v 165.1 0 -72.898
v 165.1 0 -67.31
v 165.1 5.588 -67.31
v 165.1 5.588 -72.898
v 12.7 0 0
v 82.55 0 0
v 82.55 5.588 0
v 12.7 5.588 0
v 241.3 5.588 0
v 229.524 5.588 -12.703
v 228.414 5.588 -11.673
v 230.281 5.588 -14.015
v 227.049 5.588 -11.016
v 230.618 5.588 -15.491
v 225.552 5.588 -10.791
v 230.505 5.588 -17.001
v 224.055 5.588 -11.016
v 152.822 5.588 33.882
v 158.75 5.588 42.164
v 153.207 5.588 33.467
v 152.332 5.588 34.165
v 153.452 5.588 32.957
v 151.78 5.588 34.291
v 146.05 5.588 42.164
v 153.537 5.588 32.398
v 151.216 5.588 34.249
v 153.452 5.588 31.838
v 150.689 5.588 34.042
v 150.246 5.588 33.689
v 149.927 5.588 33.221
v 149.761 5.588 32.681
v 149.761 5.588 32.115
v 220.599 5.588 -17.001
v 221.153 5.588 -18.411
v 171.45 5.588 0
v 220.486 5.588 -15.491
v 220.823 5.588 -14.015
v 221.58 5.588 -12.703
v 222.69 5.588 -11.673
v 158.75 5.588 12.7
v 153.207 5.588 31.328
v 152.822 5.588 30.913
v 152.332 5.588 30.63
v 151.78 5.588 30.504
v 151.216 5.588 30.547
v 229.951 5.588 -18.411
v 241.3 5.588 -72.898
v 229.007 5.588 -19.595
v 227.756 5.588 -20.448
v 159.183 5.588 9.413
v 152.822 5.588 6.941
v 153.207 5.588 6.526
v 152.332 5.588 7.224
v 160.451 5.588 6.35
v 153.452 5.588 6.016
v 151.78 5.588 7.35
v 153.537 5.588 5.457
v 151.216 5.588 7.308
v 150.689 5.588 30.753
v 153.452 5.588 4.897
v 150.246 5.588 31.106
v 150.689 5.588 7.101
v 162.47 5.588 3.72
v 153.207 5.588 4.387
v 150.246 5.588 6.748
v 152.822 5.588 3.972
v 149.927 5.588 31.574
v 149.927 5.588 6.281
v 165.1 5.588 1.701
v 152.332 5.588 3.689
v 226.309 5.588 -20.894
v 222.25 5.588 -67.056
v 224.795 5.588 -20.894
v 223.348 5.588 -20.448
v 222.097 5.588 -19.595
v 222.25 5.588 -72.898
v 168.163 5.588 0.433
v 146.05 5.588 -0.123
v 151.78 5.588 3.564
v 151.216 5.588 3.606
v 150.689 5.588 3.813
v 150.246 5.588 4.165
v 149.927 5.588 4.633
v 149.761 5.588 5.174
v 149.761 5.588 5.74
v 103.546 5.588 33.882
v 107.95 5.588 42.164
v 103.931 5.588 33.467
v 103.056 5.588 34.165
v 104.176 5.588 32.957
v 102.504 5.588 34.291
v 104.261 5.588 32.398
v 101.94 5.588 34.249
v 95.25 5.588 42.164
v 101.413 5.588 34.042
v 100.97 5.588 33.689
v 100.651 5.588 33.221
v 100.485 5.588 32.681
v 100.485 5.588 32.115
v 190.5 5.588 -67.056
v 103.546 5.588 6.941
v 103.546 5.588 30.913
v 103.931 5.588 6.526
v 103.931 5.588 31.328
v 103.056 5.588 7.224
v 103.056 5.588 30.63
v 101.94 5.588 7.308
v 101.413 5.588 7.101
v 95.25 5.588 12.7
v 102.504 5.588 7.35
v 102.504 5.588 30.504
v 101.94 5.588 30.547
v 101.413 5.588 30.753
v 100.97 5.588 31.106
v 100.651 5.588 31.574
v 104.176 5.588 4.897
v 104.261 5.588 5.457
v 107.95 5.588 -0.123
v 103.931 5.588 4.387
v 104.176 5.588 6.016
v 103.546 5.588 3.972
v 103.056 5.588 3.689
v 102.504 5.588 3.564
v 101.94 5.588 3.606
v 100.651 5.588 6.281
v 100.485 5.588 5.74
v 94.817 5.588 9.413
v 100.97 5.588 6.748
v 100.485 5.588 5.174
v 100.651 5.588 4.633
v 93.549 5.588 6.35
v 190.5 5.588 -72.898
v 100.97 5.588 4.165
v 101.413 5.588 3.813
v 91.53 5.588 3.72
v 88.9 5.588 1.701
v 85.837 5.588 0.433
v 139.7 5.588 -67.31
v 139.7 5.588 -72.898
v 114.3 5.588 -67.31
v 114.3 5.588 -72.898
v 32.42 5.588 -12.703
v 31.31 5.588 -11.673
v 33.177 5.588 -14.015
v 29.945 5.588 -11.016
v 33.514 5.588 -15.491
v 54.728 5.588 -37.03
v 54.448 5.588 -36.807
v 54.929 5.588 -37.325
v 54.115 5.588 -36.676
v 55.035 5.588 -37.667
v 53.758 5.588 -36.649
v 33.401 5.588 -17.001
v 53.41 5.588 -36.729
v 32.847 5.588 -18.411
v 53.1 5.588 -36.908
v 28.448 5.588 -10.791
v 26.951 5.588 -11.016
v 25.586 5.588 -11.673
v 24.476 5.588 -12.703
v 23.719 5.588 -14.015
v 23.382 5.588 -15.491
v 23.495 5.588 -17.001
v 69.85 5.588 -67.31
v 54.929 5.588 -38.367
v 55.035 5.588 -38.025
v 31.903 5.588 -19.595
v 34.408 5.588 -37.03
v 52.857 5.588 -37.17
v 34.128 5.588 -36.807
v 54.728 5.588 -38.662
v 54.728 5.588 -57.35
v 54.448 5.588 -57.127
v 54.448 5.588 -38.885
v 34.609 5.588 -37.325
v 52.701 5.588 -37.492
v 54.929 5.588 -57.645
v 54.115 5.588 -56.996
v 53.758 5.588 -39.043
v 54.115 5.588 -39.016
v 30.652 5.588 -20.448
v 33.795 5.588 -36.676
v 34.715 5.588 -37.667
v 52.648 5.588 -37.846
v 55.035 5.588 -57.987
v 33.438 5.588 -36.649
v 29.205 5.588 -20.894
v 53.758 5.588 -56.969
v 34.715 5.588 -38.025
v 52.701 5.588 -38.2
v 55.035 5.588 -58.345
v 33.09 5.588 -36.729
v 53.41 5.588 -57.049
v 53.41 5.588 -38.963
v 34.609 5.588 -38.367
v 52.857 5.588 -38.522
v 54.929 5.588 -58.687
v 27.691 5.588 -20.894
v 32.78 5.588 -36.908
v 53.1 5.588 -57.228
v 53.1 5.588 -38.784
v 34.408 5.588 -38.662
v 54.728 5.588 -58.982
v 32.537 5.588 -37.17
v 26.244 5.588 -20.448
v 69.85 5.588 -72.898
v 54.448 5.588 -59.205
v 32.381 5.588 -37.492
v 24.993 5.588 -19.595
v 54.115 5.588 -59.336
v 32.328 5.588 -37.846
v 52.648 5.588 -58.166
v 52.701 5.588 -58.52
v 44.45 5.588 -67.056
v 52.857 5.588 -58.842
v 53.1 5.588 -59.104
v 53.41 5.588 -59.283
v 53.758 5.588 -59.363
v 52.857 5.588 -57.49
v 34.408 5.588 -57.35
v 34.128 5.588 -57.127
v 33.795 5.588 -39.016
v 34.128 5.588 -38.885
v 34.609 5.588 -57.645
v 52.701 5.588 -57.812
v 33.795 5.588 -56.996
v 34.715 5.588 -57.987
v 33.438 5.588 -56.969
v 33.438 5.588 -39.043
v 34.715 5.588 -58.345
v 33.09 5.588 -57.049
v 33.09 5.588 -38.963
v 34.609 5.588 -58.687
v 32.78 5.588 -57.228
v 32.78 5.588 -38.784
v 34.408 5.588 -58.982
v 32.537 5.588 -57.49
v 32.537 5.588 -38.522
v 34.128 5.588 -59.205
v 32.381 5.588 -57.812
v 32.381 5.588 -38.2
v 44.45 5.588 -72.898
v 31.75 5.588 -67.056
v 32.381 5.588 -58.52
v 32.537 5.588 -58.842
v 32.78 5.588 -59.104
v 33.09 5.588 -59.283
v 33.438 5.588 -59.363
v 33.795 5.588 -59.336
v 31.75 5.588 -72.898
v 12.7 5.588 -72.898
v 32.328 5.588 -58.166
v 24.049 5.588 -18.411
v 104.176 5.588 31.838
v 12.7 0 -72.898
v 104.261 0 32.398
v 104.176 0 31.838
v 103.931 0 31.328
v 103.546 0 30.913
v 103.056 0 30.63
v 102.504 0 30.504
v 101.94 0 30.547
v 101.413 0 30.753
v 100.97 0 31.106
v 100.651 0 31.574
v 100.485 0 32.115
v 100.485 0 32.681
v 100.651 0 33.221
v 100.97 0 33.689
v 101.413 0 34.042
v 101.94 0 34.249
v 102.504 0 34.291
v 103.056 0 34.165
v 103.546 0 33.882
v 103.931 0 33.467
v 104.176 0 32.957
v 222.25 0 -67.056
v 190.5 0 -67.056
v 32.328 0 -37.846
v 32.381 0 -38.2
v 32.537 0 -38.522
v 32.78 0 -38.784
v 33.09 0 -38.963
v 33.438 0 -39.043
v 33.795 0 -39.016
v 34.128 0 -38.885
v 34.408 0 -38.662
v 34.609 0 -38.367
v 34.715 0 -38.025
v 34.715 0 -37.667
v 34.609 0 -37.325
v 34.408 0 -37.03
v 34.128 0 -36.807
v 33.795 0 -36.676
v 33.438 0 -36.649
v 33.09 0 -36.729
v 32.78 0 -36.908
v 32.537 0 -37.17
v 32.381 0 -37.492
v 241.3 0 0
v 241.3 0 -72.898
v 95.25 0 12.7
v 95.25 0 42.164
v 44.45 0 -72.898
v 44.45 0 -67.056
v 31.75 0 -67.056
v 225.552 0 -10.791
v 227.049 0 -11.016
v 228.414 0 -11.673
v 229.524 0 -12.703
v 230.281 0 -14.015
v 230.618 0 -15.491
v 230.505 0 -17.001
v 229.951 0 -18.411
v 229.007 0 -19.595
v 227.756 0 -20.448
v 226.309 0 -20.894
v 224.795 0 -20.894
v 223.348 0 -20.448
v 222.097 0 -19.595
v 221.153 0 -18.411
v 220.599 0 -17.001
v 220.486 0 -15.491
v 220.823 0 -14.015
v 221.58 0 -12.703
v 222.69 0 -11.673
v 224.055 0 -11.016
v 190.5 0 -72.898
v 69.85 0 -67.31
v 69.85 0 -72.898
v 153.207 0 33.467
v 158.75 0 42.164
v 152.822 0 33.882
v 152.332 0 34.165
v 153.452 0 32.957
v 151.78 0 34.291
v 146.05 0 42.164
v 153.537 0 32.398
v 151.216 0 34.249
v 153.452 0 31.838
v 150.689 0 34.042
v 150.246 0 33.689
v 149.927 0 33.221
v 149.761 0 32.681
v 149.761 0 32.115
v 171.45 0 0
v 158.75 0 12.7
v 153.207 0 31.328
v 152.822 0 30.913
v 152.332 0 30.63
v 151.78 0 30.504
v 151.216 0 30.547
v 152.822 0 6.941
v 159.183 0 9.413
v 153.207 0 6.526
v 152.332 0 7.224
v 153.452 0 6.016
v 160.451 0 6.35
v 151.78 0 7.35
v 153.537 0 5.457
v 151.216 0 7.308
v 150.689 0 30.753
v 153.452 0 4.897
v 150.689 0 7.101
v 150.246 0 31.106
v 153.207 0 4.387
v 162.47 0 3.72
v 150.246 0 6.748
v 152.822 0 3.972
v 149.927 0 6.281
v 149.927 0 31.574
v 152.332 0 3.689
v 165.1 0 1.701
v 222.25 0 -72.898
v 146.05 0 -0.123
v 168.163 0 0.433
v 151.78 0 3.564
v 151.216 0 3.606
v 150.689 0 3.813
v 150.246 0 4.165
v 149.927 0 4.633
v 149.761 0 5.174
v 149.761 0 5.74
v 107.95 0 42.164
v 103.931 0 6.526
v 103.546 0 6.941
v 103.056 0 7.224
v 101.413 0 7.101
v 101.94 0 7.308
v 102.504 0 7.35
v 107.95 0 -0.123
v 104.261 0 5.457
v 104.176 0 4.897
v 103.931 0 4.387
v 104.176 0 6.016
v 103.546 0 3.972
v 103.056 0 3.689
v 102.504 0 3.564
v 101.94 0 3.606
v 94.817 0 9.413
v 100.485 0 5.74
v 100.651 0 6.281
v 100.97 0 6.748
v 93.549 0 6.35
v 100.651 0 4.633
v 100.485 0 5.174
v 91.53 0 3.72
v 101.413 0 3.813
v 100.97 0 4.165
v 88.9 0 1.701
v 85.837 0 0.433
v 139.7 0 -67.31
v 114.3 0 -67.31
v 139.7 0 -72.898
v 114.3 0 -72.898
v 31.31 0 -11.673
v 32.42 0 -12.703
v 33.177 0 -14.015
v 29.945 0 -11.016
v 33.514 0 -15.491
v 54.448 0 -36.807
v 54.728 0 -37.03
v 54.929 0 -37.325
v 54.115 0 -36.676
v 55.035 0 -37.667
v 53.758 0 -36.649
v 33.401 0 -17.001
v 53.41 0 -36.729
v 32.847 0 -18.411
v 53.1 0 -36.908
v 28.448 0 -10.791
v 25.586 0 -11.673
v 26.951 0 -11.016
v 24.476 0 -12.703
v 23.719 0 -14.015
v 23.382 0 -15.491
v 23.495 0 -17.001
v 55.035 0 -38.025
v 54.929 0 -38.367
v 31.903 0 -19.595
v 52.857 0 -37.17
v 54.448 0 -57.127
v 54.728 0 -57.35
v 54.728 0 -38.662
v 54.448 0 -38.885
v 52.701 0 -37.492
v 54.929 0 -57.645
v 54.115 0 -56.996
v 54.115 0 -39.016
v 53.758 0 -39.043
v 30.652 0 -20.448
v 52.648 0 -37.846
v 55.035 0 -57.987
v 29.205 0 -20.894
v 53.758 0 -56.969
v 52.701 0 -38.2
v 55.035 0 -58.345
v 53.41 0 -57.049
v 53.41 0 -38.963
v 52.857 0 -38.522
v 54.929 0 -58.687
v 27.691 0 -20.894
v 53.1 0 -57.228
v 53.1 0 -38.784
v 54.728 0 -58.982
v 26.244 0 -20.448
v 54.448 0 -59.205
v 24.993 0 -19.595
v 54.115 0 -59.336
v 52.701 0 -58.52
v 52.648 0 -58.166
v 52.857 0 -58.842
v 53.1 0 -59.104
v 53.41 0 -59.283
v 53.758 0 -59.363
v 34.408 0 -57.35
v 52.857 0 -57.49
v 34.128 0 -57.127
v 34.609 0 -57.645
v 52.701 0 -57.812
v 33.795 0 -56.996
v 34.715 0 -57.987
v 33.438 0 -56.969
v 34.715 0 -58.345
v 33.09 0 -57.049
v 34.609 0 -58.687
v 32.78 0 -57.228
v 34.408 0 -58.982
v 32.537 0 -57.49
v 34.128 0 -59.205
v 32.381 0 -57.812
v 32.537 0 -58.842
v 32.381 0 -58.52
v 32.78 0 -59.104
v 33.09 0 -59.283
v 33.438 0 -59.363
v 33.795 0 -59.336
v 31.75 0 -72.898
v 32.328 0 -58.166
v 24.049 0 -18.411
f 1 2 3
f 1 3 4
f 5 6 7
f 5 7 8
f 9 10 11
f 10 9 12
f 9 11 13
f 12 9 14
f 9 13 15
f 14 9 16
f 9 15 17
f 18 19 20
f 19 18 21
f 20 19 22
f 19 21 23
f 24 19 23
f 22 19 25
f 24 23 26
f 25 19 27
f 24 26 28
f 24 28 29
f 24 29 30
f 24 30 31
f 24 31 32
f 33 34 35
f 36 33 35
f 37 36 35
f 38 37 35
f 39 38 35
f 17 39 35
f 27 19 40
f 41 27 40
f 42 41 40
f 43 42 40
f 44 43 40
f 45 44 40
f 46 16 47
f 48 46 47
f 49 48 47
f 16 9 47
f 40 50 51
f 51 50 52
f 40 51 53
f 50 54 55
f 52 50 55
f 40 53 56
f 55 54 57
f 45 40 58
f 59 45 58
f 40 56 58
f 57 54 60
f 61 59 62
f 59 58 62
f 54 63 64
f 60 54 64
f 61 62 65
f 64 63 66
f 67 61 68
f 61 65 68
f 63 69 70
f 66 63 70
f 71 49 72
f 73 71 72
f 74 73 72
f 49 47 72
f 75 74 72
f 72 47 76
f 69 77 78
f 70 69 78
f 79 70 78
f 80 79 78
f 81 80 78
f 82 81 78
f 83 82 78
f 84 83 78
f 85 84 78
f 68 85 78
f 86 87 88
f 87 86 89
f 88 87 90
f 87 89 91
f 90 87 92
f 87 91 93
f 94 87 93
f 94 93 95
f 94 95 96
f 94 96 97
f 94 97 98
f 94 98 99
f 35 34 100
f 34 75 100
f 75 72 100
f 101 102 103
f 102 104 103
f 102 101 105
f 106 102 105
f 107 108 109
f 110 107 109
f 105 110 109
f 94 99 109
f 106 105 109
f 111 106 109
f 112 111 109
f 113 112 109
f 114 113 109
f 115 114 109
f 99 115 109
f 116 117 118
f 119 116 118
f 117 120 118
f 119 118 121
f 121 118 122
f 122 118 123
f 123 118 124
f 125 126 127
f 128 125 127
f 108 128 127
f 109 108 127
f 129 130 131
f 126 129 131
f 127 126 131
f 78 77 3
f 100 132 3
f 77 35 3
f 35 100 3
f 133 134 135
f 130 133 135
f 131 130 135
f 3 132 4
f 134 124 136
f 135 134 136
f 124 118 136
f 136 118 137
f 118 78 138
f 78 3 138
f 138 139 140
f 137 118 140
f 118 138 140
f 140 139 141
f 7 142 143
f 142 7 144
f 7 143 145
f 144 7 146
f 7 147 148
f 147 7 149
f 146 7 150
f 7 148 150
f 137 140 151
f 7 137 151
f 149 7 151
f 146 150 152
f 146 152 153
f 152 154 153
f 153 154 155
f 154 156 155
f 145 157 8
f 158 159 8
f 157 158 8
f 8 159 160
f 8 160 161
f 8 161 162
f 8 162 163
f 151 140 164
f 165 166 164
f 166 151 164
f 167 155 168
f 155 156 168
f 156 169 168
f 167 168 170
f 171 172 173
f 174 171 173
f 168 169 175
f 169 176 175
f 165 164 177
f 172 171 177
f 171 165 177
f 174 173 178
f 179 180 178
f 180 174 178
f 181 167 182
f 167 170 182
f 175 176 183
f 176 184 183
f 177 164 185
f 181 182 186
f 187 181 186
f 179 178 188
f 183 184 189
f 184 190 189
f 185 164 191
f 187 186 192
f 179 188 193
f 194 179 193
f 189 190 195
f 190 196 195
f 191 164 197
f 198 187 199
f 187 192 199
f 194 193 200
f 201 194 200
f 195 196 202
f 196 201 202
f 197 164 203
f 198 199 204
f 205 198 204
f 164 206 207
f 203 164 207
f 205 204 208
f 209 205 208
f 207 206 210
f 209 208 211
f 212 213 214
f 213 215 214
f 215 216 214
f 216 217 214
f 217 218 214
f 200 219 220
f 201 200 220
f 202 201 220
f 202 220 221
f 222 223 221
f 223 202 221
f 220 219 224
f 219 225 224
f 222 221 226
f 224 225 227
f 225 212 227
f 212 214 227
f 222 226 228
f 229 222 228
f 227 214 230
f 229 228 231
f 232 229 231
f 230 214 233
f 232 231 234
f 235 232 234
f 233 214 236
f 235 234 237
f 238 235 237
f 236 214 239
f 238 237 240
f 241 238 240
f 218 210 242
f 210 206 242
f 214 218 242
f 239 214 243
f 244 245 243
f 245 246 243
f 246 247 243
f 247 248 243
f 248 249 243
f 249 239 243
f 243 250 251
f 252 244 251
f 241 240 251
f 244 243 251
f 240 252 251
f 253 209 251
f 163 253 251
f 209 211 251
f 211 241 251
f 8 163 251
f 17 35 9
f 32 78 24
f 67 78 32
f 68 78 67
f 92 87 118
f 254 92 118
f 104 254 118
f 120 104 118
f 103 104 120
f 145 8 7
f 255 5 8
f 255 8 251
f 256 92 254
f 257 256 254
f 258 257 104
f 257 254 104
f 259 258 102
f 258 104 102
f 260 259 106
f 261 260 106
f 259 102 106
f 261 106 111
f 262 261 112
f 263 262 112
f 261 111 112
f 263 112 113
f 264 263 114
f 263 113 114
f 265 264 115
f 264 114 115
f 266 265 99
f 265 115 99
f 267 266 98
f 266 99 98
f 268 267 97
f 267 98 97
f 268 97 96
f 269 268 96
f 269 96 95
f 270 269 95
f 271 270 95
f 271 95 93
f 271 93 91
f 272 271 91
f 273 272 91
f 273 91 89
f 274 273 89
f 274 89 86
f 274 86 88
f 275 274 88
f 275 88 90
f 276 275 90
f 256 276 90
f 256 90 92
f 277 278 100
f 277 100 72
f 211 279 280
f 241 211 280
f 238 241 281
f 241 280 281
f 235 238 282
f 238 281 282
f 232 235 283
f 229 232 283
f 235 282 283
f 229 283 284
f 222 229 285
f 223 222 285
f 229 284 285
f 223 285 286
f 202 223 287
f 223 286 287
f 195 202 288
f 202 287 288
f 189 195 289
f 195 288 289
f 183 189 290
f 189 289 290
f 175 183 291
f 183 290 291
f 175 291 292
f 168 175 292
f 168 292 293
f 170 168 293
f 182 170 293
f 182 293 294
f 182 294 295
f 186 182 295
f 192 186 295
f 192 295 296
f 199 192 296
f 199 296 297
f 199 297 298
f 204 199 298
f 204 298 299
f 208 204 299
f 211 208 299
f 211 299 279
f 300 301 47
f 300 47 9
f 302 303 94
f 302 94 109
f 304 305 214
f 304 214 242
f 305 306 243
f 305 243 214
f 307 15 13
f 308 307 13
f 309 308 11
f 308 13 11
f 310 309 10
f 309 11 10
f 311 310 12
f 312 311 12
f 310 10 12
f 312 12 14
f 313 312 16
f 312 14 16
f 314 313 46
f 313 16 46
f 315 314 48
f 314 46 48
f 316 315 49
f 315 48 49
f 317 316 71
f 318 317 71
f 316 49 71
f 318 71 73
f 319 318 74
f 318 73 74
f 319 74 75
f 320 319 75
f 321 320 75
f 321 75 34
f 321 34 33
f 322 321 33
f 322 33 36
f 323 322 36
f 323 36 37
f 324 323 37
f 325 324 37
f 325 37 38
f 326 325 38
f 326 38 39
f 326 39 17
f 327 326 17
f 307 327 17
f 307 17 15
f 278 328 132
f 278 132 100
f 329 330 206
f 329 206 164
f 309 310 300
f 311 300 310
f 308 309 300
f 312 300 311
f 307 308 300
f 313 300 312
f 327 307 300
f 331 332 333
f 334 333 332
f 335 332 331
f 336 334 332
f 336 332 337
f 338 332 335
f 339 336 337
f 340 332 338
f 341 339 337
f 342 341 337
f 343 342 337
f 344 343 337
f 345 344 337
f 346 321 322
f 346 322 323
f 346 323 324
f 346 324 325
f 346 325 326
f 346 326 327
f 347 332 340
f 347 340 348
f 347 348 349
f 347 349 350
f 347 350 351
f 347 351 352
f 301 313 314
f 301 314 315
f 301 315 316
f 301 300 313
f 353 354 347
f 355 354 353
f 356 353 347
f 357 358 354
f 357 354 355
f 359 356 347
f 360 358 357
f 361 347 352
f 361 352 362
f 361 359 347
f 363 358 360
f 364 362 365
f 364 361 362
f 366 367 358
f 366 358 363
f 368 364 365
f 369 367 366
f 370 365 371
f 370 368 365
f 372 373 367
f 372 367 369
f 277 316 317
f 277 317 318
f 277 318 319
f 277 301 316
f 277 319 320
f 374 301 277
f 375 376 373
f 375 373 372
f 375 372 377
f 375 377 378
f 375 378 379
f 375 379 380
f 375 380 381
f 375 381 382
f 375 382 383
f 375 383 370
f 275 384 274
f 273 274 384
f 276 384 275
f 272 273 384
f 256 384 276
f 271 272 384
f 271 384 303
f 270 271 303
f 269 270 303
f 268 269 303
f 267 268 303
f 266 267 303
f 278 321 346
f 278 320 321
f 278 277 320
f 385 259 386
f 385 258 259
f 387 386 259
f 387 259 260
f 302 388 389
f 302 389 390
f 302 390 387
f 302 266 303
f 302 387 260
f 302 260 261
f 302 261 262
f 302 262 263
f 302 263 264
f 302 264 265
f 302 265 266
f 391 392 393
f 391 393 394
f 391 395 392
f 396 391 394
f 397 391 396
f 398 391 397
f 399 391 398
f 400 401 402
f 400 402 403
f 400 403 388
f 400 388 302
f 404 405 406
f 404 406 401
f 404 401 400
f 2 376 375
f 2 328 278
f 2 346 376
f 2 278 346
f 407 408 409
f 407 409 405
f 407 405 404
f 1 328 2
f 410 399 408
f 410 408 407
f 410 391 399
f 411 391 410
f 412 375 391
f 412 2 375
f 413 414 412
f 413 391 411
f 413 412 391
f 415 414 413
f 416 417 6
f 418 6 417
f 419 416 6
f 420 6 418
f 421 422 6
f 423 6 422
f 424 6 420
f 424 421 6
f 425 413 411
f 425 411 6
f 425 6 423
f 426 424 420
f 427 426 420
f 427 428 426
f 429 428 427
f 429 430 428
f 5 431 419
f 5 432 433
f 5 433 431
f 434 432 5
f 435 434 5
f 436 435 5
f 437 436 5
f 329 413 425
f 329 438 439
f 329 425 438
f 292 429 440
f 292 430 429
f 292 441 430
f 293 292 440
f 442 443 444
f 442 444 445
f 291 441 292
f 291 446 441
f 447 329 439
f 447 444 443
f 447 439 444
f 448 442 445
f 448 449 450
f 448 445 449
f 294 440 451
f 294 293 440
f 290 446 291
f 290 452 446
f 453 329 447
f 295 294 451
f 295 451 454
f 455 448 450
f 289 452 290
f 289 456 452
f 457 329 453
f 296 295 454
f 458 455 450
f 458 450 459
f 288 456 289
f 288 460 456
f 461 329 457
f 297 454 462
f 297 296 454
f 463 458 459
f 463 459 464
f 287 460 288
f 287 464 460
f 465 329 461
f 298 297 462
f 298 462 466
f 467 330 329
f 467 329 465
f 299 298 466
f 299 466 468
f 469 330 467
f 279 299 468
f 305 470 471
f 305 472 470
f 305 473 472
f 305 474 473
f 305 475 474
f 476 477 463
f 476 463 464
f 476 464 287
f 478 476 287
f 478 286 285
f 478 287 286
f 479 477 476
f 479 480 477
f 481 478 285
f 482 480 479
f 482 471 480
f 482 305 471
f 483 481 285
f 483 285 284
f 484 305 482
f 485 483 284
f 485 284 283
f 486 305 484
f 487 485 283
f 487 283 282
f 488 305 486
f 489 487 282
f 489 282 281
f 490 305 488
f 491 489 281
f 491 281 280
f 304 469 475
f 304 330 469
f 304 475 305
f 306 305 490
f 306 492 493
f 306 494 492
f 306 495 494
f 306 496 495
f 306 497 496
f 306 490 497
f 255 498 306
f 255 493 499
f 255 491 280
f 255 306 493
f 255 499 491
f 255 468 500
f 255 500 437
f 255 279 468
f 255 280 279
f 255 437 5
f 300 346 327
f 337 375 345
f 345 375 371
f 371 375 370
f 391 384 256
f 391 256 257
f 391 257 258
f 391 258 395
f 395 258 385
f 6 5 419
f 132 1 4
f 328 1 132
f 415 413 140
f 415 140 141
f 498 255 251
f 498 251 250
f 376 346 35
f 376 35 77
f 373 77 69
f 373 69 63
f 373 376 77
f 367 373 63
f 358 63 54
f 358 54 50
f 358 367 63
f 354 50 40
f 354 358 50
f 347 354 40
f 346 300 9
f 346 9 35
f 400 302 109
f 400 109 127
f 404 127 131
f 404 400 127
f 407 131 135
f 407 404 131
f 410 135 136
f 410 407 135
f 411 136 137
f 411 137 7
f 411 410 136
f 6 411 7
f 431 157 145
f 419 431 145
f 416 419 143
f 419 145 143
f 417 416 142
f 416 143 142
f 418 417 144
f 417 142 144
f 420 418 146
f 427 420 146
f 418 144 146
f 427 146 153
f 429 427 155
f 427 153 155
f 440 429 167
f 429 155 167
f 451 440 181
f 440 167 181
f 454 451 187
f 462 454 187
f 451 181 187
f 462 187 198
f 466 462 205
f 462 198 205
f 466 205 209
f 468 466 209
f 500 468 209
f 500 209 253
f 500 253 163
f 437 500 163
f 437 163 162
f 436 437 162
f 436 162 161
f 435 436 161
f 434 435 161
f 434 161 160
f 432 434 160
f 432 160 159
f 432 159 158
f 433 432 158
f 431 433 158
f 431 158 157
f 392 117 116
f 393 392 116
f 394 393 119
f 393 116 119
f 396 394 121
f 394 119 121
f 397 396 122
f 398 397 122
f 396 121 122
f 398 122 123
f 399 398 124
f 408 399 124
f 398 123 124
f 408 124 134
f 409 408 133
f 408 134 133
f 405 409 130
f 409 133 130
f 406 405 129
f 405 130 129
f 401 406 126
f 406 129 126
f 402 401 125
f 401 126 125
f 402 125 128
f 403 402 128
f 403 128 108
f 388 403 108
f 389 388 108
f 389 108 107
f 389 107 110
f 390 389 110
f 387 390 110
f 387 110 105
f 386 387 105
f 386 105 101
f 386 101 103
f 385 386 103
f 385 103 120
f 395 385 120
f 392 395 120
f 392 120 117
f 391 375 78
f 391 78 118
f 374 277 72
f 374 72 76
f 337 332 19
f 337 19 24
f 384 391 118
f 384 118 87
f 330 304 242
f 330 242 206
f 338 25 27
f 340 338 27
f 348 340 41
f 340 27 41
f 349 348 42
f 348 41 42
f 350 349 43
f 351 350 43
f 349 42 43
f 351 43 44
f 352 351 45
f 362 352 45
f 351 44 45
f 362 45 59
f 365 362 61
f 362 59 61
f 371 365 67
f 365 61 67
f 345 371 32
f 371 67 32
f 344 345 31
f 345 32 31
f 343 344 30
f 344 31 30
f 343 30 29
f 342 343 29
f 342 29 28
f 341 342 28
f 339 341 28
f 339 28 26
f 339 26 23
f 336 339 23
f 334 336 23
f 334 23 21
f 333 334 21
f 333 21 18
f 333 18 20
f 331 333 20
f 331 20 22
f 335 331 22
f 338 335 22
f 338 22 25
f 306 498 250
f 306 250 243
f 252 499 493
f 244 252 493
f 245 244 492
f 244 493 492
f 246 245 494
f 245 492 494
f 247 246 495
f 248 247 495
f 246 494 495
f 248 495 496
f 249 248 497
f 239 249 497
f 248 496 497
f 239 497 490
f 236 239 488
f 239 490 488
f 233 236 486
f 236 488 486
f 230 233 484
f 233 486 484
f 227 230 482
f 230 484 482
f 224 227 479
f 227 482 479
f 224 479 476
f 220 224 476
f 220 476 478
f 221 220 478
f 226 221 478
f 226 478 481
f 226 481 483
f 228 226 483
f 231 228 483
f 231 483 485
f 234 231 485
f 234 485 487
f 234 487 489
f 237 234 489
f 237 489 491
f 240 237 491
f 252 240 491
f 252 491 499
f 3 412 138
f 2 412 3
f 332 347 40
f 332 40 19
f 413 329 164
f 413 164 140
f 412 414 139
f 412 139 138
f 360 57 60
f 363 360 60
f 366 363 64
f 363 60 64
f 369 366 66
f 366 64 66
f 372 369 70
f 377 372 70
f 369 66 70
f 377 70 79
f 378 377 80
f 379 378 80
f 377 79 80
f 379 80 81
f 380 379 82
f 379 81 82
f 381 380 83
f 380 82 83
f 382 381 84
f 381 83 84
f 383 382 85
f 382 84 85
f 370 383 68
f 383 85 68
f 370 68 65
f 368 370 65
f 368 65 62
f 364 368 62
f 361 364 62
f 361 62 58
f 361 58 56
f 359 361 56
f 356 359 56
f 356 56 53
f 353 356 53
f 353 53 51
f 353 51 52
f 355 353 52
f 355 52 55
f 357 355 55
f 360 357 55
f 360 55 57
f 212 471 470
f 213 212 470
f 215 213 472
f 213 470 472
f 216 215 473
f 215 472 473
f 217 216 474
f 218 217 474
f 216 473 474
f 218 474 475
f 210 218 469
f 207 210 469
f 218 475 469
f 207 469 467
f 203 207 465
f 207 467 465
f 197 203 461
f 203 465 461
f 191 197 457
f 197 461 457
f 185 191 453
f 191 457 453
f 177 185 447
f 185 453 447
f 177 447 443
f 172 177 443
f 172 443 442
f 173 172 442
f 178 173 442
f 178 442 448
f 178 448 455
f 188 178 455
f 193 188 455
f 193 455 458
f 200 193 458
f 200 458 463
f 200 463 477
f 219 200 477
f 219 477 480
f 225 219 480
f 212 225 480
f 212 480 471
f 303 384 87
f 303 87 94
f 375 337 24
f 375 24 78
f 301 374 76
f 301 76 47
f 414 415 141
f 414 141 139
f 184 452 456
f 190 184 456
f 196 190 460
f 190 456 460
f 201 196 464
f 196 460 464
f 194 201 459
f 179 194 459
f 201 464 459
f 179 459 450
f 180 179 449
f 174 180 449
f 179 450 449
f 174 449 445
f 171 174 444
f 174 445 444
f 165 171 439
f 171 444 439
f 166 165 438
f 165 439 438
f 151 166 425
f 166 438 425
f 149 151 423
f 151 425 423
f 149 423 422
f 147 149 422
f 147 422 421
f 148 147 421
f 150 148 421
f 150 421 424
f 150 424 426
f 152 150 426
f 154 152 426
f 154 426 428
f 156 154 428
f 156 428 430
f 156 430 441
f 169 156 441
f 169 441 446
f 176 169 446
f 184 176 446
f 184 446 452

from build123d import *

# Parameters (mm, degrees)
BOSS_EXTRUDE1_DEPTH   = 5.588
F_6_CLEARANCE_HOLE1_D = 3.7973
M2_CLEARANCE_HOLE1_D  = 2.4
CUT_EXTRUDE1_REACH    = 254.133
SKETCH8_R             = 5.08


with BuildPart() as part:
    # Sketch1 → Boss-Extrude1 (new body)
    with BuildSketch(Plane(origin=(0, 0, 0), x_dir=(1, 0, 0), z_dir=(0, 1, 0))):
        with BuildLine():
            Line((12.7, 72.898), (31.75, 72.898))
            Line((31.75, 72.898), (31.75, 67.056))
            Line((31.75, 67.056), (44.45, 67.056))
            Line((44.45, 67.056), (44.45, 72.898))
            Line((44.45, 72.898), (69.85, 72.898))
            Line((69.85, 72.898), (69.85, 67.31))
            Line((69.85, 67.31), (114.3, 67.31))
            Line((114.3, 67.31), (114.3, 72.898))
            Line((114.3, 72.898), (139.7, 72.898))
            Line((139.7, 72.898), (139.7, 67.31))
            Line((139.7, 67.31), (165.1, 67.31))
            Line((165.1, 67.31), (165.1, 72.898))
            Line((165.1, 72.898), (190.5, 72.898))
            Line((190.5, 72.898), (190.5, 67.056))
            Line((190.5, 67.056), (222.25, 67.056))
            Line((222.25, 67.056), (222.25, 72.898))
            Line((222.25, 72.898), (241.3, 72.898))
            Line((241.3, 72.898), (241.3, 0))
            Line((241.3, 0), (171.45, 0))
            ThreePointArc((171.45, 0), (162.469743879, -3.719743879), (158.75, -12.7))
            Line((158.75, -12.7), (158.75, -42.164))
            Line((158.75, -42.164), (146.05, -42.164))
            Line((146.05, -42.164), (146.05, 0.122766638))
            Line((146.05, 0.122766638), (127, 0.122766638))
            Line((127, 0.122766638), (107.95, 0.122766638))
            Line((107.95, 0.122766638), (107.95, -42.164))
            Line((107.95, -42.164), (95.25, -42.164))
            Line((95.25, -42.164), (95.25, -12.7))
            ThreePointArc((95.25, -12.7), (91.530256121, -3.719743879), (82.55, 0))
            Line((82.55, 0), (12.7, 0))
            Line((12.7, 0), (12.7, 72.898))
        make_face()
    extrude(amount=BOSS_EXTRUDE1_DEPTH)

    # #6 Clearance Hole1 (through all)
    with Locations(Plane(origin=(0, 0, 0), x_dir=(-1, 0, 0), z_dir=(0, -1, 0))):
        with Locations((-102.362, -32.397617544), (-151.638, -32.397617544), (-151.638, -5.456849181), (-102.362, -5.456849181)):
            Hole(F_6_CLEARANCE_HOLE1_D / 2)

    # M2 Clearance Hole1 (through all)
    with Locations(Plane(origin=(0, 5.588, 0), x_dir=(1, 0, 0), z_dir=(0, 1, 0))):
        with Locations((33.528, 58.166), (53.848, 58.166), (53.848, 37.846), (33.528, 37.846)):
            Hole(M2_CLEARANCE_HOLE1_D / 2)

    # Sketch8 → Cut-Extrude1 (cut, up to next)
    with BuildSketch(Plane(origin=(0, 5.588, 0), x_dir=(1, 0, 0), z_dir=(0, 1, 0)), mode=Mode.PRIVATE) as cut_extrude1_sk1:
        with Locations(Location((28.448, 15.870766638, 0), (0, 0, 270))):
            Circle(SKETCH8_R)
    cut_extrude1_tool1 = extrude(cut_extrude1_sk1.sketch, amount=-CUT_EXTRUDE1_REACH, mode=Mode.PRIVATE) & part.part
    # Sketch8 → Cut-Extrude1 (cut, up to next)
    with BuildSketch(Plane(origin=(0, 5.588, 0), x_dir=(1, 0, 0), z_dir=(0, 1, 0)), mode=Mode.PRIVATE) as cut_extrude1_sk2:
        with Locations(Location((225.552, 15.870766638, 0), (0, 0, 270))):
            Circle(SKETCH8_R)
    cut_extrude1_tool2 = extrude(cut_extrude1_sk2.sketch, amount=-CUT_EXTRUDE1_REACH, mode=Mode.PRIVATE) & part.part
    add(cut_extrude1_tool1.solids().sort_by_distance((28.448, 5.588, -15.870767))[0], mode=Mode.SUBTRACT)
    add(cut_extrude1_tool2.solids().sort_by_distance((225.552, 5.588, -15.870767))[0], mode=Mode.SUBTRACT)


solid = part.part
